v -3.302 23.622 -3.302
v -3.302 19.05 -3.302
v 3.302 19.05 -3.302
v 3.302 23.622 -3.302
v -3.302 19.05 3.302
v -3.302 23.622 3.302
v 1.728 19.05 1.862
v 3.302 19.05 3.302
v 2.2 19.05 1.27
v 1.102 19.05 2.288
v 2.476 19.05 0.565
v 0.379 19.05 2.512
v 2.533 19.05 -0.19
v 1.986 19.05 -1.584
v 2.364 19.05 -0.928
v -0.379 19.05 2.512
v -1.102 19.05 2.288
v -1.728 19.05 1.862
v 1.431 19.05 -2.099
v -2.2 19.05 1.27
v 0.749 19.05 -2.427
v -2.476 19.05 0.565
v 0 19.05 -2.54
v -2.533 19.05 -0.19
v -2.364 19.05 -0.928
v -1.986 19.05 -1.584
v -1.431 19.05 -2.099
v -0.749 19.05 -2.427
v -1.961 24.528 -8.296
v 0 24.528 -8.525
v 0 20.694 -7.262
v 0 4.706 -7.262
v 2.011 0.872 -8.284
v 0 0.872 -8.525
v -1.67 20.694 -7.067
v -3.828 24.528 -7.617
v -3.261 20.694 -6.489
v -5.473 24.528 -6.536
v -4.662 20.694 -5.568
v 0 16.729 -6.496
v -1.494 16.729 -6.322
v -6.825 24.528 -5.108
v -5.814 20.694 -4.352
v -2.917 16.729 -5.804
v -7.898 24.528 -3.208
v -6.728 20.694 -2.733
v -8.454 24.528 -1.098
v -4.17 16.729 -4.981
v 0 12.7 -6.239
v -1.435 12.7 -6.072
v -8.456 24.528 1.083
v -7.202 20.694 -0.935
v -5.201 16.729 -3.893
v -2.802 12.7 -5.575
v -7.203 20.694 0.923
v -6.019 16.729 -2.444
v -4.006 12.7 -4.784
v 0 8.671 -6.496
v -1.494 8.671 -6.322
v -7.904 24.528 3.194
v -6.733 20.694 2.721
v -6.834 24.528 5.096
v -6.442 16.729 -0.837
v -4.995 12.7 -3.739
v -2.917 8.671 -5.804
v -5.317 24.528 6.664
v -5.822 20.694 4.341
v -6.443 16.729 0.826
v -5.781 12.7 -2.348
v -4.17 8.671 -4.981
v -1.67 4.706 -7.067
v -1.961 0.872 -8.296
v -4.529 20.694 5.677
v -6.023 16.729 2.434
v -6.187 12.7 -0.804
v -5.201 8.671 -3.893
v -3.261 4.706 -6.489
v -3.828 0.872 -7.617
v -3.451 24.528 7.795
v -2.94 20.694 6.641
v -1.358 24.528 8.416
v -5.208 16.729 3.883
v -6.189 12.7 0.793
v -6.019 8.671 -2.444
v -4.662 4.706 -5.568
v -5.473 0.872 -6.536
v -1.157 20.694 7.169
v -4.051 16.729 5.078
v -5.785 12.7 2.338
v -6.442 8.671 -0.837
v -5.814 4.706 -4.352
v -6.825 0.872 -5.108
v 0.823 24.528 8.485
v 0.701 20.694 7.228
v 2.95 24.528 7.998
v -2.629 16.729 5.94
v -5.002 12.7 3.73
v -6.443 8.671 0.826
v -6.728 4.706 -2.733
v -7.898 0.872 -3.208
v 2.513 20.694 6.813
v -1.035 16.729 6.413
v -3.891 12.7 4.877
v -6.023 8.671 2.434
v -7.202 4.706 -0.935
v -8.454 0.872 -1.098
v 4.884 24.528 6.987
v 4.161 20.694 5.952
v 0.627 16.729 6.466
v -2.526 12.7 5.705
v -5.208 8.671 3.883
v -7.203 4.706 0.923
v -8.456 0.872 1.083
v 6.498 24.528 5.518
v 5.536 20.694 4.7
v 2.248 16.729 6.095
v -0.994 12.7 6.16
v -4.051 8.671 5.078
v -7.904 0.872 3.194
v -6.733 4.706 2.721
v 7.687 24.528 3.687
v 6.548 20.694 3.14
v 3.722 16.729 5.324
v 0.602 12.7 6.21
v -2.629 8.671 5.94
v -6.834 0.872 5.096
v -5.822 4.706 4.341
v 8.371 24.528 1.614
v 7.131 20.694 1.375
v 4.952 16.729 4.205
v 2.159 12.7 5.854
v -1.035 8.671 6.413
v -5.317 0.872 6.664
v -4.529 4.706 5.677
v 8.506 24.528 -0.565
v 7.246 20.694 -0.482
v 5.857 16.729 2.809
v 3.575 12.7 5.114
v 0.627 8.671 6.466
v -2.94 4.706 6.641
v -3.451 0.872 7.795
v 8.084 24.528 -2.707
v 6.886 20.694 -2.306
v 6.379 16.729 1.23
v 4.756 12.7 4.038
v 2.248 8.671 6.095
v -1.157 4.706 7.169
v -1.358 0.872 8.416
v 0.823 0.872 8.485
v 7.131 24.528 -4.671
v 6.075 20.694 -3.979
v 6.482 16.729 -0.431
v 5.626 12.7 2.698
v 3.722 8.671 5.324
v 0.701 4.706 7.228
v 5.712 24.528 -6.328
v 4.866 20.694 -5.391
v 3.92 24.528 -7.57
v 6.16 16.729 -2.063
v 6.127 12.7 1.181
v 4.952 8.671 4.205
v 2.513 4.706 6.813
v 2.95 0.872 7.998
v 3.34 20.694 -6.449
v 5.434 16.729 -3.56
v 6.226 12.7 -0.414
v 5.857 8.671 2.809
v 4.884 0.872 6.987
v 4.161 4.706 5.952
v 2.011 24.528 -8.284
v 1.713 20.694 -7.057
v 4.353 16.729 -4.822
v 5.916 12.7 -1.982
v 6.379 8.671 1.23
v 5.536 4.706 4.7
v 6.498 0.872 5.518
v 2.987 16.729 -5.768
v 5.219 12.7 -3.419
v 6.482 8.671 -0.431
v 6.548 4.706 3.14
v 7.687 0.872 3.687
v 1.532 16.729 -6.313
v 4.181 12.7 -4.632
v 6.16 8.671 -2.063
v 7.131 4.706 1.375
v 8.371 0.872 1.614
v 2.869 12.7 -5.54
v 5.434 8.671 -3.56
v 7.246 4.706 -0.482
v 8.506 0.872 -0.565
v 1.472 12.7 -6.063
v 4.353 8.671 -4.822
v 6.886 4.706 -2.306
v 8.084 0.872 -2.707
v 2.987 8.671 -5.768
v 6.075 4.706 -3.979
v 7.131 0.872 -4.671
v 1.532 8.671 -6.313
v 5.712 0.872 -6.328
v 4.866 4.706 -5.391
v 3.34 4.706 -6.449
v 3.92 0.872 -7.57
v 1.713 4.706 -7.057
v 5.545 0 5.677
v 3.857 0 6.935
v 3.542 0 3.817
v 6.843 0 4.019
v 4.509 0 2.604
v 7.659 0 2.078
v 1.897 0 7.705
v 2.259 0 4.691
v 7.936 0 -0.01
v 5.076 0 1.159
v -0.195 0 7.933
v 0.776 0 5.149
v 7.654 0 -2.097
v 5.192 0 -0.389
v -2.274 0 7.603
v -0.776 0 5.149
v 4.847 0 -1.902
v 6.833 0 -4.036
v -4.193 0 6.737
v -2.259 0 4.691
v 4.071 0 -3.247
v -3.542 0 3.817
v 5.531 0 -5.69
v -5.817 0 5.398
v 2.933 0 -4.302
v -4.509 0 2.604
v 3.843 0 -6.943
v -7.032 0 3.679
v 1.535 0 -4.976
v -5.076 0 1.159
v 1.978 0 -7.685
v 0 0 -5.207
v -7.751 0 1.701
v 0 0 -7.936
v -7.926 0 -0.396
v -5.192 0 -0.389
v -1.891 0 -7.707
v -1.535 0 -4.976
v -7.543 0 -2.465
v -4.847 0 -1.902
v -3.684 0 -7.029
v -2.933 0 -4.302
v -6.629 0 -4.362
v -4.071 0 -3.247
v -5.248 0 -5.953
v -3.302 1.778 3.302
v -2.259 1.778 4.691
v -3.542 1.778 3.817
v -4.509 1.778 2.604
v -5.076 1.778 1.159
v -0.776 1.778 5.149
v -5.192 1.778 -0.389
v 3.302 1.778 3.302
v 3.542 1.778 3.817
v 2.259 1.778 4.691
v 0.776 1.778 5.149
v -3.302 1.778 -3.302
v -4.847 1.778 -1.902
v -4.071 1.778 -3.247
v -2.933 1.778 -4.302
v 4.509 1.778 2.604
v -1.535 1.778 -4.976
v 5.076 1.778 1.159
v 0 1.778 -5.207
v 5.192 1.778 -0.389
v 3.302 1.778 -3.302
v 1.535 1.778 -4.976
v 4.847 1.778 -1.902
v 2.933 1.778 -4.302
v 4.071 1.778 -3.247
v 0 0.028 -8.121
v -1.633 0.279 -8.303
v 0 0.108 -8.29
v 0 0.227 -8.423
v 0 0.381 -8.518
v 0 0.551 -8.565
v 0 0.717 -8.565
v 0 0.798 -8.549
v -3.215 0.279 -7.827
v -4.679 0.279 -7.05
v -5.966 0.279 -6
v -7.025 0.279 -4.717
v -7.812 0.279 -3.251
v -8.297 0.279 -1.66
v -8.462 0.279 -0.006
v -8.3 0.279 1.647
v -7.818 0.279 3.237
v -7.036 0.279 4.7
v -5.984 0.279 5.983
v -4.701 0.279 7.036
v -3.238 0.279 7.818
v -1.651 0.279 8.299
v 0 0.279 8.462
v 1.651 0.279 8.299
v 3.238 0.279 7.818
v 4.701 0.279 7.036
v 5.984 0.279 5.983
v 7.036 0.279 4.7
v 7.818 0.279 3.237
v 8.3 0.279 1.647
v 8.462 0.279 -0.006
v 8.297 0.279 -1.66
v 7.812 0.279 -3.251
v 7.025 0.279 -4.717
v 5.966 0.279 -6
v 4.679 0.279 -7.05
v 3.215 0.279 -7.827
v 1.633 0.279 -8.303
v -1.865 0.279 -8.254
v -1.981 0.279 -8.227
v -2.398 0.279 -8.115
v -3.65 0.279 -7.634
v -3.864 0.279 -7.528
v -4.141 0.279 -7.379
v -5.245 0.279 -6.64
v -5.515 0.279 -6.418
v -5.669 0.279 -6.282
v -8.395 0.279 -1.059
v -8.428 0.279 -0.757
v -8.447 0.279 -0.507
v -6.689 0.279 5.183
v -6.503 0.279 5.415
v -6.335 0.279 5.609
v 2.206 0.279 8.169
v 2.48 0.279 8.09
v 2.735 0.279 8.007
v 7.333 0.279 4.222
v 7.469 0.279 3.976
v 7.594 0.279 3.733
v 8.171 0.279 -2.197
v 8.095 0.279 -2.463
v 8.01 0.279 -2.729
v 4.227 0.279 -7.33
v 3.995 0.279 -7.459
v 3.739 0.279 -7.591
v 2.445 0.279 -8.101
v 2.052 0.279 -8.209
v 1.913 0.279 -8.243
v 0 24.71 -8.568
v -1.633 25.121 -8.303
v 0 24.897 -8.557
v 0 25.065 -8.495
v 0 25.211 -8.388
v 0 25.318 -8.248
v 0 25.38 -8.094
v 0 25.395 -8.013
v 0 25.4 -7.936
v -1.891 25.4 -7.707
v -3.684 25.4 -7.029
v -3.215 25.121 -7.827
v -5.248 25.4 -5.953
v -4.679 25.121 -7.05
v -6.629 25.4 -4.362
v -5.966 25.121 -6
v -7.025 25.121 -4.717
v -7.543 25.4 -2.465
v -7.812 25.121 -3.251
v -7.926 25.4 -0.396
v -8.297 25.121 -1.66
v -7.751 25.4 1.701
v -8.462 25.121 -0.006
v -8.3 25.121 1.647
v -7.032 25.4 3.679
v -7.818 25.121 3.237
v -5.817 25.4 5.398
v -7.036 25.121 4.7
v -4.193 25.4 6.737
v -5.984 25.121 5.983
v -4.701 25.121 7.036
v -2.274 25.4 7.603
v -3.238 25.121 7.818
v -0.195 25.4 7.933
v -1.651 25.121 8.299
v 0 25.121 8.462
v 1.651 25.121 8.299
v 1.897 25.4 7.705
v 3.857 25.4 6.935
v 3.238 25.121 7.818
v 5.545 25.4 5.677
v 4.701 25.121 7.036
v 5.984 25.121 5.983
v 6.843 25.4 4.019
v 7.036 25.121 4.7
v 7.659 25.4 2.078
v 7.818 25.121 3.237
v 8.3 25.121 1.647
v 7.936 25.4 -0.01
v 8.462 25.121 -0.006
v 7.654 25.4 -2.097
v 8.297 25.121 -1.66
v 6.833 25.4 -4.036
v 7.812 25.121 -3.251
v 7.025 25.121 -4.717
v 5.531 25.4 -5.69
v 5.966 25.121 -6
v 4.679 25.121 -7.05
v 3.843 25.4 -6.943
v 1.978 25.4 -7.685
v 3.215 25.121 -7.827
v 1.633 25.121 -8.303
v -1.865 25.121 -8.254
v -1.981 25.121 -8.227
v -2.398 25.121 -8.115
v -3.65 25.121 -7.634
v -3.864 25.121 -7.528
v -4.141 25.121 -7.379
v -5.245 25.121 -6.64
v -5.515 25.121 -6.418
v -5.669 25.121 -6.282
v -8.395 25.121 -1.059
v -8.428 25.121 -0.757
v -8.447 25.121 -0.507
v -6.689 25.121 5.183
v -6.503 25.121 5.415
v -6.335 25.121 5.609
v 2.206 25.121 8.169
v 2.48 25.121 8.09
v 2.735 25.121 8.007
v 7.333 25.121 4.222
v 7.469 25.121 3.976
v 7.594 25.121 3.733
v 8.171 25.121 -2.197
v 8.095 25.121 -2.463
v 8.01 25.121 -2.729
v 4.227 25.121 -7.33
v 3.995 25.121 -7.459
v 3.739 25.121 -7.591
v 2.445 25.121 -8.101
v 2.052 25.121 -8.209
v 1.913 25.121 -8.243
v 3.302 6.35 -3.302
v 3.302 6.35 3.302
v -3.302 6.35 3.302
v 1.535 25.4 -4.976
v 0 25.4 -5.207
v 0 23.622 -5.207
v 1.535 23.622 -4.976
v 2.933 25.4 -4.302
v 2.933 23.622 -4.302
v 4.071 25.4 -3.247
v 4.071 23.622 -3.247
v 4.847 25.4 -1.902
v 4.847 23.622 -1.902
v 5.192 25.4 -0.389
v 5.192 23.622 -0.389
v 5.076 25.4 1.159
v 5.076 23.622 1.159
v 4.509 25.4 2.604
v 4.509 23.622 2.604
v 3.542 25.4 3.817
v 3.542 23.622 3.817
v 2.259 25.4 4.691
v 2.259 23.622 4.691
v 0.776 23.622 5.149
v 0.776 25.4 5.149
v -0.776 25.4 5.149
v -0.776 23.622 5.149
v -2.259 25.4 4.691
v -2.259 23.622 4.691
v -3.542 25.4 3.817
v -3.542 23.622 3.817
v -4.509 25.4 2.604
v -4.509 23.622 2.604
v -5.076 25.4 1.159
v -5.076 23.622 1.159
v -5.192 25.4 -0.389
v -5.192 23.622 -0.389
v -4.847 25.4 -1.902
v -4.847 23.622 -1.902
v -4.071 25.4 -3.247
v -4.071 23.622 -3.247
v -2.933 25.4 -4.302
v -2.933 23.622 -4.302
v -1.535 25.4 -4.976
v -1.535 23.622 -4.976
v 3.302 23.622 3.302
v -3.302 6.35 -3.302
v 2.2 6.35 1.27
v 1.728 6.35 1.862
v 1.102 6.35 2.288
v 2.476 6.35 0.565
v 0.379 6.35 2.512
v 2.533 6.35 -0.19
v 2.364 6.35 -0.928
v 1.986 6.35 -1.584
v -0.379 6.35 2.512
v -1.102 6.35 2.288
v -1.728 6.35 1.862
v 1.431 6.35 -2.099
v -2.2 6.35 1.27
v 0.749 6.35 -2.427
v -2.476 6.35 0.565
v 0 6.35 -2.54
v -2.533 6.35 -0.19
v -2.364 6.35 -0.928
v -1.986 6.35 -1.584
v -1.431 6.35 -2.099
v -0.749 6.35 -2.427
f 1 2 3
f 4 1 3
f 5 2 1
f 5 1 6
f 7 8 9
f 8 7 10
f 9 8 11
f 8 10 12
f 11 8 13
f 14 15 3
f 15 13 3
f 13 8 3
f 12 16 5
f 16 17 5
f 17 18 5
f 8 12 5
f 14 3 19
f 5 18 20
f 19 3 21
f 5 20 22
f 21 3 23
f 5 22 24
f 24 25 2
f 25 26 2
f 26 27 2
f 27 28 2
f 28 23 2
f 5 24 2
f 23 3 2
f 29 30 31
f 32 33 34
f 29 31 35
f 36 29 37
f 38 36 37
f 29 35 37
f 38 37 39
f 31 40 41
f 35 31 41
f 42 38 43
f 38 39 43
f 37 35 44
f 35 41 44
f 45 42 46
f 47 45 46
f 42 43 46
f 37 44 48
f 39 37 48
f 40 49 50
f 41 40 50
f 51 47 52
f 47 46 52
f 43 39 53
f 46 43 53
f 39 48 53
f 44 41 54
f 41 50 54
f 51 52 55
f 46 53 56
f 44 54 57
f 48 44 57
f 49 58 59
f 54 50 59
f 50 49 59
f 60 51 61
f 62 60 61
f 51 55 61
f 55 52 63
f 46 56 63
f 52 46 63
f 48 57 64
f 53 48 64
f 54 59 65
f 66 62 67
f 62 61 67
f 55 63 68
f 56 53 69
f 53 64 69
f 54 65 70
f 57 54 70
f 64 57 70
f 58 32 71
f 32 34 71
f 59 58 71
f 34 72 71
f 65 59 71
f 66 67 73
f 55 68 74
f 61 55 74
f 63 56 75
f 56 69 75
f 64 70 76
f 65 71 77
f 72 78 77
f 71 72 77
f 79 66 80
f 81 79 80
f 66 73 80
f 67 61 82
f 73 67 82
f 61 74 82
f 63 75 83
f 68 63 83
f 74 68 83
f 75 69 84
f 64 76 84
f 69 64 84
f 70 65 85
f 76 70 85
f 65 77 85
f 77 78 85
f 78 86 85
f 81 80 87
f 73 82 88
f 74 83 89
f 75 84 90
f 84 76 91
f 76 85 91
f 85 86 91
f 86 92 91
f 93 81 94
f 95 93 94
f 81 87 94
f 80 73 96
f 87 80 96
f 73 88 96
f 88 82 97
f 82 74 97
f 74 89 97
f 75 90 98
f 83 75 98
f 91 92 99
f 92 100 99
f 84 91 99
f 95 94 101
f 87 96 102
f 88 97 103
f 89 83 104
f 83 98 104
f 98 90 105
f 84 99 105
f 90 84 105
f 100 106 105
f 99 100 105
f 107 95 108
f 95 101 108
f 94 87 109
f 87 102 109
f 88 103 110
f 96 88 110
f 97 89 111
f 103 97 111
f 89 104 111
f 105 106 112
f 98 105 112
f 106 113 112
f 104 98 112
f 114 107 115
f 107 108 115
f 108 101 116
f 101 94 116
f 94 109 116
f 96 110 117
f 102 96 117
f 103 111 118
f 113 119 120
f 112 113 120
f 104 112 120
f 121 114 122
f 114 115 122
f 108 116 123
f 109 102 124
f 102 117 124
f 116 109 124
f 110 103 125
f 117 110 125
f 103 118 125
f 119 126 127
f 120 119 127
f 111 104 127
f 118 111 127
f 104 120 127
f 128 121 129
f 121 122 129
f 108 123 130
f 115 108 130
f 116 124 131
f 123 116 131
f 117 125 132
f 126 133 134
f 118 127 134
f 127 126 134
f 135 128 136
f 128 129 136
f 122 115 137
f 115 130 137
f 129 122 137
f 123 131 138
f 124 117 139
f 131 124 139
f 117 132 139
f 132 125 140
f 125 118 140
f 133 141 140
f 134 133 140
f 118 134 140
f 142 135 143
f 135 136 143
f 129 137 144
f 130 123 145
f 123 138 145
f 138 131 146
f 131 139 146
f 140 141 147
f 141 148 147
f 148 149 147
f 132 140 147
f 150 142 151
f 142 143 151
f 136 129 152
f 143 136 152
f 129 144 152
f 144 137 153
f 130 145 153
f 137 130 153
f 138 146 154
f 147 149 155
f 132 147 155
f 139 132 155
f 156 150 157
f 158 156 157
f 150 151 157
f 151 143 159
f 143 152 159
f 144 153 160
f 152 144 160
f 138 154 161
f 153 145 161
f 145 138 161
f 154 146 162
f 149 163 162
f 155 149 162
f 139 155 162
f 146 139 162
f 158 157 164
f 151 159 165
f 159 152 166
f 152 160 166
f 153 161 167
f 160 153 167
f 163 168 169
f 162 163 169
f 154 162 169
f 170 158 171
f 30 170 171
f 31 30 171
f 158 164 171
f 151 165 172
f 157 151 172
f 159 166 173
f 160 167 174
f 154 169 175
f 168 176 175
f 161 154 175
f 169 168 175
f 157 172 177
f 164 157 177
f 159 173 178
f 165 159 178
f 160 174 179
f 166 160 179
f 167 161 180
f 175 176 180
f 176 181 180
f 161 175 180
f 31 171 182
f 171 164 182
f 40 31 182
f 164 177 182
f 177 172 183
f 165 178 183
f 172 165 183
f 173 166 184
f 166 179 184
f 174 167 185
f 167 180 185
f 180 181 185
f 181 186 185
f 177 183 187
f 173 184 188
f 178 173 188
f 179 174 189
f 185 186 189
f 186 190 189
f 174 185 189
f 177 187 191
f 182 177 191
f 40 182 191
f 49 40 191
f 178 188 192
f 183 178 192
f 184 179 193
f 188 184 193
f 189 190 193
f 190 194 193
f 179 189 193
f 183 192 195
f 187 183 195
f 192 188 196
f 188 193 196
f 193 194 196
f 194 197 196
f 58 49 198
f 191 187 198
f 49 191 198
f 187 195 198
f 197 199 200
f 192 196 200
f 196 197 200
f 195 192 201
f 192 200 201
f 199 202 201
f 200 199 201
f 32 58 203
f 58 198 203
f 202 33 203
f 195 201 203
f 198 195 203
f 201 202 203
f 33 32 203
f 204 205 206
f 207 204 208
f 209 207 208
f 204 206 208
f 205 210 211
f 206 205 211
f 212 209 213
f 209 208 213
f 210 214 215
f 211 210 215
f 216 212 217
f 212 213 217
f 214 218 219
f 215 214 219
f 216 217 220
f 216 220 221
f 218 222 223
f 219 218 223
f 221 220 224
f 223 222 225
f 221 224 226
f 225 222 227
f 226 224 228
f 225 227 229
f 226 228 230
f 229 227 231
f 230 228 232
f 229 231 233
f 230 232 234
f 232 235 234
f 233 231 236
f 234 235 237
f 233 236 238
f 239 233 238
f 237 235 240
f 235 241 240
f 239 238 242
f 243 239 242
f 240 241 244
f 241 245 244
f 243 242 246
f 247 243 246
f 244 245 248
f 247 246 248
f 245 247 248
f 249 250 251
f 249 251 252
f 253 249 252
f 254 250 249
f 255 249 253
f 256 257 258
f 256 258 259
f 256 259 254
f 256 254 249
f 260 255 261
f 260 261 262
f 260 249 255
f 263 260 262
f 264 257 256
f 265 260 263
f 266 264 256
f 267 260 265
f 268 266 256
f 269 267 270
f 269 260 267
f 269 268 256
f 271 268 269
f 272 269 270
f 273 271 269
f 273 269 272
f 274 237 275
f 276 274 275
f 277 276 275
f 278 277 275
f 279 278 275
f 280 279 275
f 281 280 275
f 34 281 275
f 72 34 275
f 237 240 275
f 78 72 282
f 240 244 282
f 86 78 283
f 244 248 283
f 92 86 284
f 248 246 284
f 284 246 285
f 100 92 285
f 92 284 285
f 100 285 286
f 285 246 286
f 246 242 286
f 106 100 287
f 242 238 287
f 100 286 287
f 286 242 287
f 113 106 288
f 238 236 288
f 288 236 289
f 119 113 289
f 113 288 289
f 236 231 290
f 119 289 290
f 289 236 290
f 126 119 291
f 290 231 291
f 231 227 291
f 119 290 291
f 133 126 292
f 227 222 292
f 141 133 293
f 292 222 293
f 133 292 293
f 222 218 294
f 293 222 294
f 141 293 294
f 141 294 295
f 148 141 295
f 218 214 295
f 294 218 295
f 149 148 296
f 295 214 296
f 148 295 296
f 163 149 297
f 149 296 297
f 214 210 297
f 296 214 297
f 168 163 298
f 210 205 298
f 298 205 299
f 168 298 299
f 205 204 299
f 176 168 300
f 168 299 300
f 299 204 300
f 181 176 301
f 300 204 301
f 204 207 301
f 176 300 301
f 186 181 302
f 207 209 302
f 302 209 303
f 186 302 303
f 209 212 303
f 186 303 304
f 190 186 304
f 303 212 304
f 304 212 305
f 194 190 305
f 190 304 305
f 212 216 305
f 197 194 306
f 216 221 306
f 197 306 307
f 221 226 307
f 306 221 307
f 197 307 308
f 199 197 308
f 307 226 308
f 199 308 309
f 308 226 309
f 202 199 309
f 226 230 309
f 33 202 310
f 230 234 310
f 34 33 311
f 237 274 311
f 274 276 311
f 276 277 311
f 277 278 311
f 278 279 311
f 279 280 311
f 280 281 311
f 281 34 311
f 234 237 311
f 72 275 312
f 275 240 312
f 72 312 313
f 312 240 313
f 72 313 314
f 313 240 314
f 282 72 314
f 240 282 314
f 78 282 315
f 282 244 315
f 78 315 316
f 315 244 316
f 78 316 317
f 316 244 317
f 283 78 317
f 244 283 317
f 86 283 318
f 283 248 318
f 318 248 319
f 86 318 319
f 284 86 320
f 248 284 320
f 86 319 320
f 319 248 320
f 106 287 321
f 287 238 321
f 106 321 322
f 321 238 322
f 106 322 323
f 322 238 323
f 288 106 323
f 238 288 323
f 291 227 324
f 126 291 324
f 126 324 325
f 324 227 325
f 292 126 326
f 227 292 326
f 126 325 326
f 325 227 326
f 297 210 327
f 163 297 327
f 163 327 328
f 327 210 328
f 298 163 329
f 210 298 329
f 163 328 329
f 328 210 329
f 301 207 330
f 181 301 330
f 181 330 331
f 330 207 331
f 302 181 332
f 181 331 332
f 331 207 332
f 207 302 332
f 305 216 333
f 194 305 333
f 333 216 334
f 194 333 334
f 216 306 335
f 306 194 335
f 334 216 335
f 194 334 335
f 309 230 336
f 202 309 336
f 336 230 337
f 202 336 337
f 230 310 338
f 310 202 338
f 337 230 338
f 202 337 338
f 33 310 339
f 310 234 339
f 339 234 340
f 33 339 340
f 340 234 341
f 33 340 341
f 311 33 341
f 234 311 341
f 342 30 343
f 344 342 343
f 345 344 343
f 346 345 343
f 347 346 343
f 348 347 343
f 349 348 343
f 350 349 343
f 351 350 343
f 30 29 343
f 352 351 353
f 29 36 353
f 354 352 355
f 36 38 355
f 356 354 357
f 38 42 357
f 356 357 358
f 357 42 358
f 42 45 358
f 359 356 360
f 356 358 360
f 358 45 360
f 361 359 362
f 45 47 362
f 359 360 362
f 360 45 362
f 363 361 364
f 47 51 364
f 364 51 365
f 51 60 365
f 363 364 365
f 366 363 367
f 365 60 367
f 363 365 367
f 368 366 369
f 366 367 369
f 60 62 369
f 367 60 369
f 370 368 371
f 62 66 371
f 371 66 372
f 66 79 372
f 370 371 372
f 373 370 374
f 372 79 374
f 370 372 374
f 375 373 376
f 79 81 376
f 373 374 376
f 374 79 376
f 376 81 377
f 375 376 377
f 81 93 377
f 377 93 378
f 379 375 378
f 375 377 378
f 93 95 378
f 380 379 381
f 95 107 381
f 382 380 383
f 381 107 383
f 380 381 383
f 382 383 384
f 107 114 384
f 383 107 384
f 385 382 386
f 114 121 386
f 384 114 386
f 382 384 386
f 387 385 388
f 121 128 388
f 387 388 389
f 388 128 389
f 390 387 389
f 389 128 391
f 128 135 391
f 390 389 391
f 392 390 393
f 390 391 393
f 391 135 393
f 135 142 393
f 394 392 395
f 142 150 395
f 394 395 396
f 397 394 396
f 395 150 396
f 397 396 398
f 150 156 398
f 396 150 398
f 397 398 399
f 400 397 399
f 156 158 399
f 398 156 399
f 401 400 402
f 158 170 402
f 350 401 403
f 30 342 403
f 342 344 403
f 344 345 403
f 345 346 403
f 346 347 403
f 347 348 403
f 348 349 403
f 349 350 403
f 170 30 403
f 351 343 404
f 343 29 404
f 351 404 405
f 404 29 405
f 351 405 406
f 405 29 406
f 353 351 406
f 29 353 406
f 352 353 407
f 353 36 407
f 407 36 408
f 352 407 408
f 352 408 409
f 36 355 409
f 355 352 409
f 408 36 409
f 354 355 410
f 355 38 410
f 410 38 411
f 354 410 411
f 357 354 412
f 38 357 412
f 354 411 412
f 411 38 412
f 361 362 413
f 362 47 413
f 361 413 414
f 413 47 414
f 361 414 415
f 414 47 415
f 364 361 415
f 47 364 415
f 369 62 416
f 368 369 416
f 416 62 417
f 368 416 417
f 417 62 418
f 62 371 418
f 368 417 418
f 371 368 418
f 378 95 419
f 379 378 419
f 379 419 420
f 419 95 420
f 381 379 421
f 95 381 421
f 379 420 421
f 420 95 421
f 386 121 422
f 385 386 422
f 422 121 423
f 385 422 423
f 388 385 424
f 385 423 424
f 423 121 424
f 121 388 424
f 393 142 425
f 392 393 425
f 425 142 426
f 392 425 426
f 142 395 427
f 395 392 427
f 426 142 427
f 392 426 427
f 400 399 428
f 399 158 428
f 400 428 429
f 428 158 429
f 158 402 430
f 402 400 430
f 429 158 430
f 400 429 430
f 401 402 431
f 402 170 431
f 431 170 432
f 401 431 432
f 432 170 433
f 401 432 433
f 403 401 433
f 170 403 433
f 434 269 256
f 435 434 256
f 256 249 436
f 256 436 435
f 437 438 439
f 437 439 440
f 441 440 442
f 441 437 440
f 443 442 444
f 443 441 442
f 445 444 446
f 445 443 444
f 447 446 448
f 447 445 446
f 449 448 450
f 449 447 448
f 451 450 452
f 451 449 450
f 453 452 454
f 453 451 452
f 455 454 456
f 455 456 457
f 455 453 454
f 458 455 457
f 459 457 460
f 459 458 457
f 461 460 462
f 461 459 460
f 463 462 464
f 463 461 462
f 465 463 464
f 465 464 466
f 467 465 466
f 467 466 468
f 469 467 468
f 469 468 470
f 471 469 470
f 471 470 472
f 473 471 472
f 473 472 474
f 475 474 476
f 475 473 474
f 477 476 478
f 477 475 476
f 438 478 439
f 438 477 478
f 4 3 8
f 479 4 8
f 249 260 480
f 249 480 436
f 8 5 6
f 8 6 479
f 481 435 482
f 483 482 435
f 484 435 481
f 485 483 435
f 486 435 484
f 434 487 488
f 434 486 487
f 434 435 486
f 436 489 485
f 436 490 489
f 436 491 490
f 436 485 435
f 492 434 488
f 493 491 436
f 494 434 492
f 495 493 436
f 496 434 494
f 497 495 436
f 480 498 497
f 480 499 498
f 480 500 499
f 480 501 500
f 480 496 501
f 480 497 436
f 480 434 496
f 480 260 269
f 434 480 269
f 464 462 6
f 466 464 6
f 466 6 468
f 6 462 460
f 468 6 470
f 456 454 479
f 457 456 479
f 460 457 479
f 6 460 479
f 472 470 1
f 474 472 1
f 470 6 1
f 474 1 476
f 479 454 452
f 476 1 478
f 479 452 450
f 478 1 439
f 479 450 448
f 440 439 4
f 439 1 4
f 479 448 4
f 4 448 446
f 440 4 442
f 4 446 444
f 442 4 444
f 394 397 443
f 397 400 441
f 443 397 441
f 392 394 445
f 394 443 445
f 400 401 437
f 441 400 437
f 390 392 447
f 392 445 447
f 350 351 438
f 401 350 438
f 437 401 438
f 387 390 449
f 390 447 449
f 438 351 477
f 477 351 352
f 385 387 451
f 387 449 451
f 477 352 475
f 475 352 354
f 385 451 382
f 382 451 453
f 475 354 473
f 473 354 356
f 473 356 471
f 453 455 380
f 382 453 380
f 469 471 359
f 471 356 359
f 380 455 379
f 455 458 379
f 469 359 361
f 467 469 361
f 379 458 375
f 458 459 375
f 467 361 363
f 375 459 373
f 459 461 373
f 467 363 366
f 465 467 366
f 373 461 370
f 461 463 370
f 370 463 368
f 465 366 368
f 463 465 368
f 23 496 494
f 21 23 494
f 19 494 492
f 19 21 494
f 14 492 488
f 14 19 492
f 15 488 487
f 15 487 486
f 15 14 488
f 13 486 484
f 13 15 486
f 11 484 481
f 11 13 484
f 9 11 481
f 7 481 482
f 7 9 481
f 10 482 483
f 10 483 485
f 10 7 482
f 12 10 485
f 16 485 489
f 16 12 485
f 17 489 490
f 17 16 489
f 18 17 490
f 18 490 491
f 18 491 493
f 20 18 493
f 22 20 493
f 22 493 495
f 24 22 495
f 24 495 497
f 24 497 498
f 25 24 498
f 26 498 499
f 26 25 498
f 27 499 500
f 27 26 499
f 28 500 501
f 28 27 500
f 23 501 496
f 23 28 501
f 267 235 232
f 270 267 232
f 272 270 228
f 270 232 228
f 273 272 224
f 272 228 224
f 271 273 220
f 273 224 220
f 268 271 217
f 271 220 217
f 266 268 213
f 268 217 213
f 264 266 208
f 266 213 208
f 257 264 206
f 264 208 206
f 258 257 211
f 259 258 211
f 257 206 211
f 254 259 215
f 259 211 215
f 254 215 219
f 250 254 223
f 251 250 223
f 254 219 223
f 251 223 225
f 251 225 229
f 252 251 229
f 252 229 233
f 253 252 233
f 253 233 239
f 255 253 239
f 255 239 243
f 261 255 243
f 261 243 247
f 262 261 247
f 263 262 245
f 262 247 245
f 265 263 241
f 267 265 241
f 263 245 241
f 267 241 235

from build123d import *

# Parameters (mm, degrees)
SKETCH2_W           = 6.604
SKETCH2_H           = 6.604
CUT_EXTRUDE1_DEPTH  = 29.341210278
SKETCH3_R           = 5.207
CUT_EXTRUDE2_DEPTH  = 1.778
FILLET1_R           = 0.635
SKETCH4_W           = 6.604
SKETCH4_H           = 6.604
SKETCH4_R           = 2.54
BOSS_EXTRUDE1_DEPTH = 6.35


with BuildPart() as part:
    # Sketch1 → Revolve1 (revolve)
    with BuildSketch(Plane(origin=(0, 0, 0), x_dir=(0, 0, -1), z_dir=(1, 0, 0))):
        with BuildLine():
            Line((2.54, 0), (2.54, 25.4))
            Line((2.54, 25.4), (8.89, 25.4))
            ThreePointArc((8.89, 25.4), (6.239355663, 12.7), (8.89, 0))
            Line((8.89, 0), (2.54, 0))
        make_face()
    revolve(axis=Axis((0, 0, 0), (0, 1, 0)))

    # Sketch2 → Cut-Extrude1 (cut, through all)
    with BuildSketch(Plane.XZ):
        Rectangle(SKETCH2_W, SKETCH2_H)
    extrude(amount=-CUT_EXTRUDE1_DEPTH, mode=Mode.SUBTRACT)

    # Sketch3 → Cut-Extrude2 (cut)
    with BuildSketch(Plane.XZ):
        with Locations(Location((0, 0, 0), (0, 0, 270))):
            Circle(SKETCH3_R)
    cut_extrude2 = extrude(amount=-CUT_EXTRUDE2_DEPTH, mode=Mode.SUBTRACT)

    # Fillet1
    fillet1_edges = [part.edges().sort_by_distance(p)[0] for p in [
        (0, 25.4, 8.89),
        (0, 0, 8.89),
    ]]
    fillet(fillet1_edges, radius=FILLET1_R)

    # Mirror1: Cut-Extrude2 across plane
    add(cut_extrude2.mirror(Plane(origin=(0, 12.7, 0), x_dir=(0, 0, 1), z_dir=(0, -1, 0))), mode=Mode.SUBTRACT)

    # Sketch4 → Boss-Extrude1 (add, symmetric)
    with BuildSketch(Plane(origin=(0, 12.7, 0), x_dir=(-1, 0, 0), z_dir=(0, -1, 0))):
        Rectangle(SKETCH4_W, SKETCH4_H)
        with Locations(Location((0, 0, 0), (0, 0, 90))):
            Circle(SKETCH4_R, mode=Mode.SUBTRACT)
    extrude(amount=BOSS_EXTRUDE1_DEPTH, both=True)


solid = part.part
